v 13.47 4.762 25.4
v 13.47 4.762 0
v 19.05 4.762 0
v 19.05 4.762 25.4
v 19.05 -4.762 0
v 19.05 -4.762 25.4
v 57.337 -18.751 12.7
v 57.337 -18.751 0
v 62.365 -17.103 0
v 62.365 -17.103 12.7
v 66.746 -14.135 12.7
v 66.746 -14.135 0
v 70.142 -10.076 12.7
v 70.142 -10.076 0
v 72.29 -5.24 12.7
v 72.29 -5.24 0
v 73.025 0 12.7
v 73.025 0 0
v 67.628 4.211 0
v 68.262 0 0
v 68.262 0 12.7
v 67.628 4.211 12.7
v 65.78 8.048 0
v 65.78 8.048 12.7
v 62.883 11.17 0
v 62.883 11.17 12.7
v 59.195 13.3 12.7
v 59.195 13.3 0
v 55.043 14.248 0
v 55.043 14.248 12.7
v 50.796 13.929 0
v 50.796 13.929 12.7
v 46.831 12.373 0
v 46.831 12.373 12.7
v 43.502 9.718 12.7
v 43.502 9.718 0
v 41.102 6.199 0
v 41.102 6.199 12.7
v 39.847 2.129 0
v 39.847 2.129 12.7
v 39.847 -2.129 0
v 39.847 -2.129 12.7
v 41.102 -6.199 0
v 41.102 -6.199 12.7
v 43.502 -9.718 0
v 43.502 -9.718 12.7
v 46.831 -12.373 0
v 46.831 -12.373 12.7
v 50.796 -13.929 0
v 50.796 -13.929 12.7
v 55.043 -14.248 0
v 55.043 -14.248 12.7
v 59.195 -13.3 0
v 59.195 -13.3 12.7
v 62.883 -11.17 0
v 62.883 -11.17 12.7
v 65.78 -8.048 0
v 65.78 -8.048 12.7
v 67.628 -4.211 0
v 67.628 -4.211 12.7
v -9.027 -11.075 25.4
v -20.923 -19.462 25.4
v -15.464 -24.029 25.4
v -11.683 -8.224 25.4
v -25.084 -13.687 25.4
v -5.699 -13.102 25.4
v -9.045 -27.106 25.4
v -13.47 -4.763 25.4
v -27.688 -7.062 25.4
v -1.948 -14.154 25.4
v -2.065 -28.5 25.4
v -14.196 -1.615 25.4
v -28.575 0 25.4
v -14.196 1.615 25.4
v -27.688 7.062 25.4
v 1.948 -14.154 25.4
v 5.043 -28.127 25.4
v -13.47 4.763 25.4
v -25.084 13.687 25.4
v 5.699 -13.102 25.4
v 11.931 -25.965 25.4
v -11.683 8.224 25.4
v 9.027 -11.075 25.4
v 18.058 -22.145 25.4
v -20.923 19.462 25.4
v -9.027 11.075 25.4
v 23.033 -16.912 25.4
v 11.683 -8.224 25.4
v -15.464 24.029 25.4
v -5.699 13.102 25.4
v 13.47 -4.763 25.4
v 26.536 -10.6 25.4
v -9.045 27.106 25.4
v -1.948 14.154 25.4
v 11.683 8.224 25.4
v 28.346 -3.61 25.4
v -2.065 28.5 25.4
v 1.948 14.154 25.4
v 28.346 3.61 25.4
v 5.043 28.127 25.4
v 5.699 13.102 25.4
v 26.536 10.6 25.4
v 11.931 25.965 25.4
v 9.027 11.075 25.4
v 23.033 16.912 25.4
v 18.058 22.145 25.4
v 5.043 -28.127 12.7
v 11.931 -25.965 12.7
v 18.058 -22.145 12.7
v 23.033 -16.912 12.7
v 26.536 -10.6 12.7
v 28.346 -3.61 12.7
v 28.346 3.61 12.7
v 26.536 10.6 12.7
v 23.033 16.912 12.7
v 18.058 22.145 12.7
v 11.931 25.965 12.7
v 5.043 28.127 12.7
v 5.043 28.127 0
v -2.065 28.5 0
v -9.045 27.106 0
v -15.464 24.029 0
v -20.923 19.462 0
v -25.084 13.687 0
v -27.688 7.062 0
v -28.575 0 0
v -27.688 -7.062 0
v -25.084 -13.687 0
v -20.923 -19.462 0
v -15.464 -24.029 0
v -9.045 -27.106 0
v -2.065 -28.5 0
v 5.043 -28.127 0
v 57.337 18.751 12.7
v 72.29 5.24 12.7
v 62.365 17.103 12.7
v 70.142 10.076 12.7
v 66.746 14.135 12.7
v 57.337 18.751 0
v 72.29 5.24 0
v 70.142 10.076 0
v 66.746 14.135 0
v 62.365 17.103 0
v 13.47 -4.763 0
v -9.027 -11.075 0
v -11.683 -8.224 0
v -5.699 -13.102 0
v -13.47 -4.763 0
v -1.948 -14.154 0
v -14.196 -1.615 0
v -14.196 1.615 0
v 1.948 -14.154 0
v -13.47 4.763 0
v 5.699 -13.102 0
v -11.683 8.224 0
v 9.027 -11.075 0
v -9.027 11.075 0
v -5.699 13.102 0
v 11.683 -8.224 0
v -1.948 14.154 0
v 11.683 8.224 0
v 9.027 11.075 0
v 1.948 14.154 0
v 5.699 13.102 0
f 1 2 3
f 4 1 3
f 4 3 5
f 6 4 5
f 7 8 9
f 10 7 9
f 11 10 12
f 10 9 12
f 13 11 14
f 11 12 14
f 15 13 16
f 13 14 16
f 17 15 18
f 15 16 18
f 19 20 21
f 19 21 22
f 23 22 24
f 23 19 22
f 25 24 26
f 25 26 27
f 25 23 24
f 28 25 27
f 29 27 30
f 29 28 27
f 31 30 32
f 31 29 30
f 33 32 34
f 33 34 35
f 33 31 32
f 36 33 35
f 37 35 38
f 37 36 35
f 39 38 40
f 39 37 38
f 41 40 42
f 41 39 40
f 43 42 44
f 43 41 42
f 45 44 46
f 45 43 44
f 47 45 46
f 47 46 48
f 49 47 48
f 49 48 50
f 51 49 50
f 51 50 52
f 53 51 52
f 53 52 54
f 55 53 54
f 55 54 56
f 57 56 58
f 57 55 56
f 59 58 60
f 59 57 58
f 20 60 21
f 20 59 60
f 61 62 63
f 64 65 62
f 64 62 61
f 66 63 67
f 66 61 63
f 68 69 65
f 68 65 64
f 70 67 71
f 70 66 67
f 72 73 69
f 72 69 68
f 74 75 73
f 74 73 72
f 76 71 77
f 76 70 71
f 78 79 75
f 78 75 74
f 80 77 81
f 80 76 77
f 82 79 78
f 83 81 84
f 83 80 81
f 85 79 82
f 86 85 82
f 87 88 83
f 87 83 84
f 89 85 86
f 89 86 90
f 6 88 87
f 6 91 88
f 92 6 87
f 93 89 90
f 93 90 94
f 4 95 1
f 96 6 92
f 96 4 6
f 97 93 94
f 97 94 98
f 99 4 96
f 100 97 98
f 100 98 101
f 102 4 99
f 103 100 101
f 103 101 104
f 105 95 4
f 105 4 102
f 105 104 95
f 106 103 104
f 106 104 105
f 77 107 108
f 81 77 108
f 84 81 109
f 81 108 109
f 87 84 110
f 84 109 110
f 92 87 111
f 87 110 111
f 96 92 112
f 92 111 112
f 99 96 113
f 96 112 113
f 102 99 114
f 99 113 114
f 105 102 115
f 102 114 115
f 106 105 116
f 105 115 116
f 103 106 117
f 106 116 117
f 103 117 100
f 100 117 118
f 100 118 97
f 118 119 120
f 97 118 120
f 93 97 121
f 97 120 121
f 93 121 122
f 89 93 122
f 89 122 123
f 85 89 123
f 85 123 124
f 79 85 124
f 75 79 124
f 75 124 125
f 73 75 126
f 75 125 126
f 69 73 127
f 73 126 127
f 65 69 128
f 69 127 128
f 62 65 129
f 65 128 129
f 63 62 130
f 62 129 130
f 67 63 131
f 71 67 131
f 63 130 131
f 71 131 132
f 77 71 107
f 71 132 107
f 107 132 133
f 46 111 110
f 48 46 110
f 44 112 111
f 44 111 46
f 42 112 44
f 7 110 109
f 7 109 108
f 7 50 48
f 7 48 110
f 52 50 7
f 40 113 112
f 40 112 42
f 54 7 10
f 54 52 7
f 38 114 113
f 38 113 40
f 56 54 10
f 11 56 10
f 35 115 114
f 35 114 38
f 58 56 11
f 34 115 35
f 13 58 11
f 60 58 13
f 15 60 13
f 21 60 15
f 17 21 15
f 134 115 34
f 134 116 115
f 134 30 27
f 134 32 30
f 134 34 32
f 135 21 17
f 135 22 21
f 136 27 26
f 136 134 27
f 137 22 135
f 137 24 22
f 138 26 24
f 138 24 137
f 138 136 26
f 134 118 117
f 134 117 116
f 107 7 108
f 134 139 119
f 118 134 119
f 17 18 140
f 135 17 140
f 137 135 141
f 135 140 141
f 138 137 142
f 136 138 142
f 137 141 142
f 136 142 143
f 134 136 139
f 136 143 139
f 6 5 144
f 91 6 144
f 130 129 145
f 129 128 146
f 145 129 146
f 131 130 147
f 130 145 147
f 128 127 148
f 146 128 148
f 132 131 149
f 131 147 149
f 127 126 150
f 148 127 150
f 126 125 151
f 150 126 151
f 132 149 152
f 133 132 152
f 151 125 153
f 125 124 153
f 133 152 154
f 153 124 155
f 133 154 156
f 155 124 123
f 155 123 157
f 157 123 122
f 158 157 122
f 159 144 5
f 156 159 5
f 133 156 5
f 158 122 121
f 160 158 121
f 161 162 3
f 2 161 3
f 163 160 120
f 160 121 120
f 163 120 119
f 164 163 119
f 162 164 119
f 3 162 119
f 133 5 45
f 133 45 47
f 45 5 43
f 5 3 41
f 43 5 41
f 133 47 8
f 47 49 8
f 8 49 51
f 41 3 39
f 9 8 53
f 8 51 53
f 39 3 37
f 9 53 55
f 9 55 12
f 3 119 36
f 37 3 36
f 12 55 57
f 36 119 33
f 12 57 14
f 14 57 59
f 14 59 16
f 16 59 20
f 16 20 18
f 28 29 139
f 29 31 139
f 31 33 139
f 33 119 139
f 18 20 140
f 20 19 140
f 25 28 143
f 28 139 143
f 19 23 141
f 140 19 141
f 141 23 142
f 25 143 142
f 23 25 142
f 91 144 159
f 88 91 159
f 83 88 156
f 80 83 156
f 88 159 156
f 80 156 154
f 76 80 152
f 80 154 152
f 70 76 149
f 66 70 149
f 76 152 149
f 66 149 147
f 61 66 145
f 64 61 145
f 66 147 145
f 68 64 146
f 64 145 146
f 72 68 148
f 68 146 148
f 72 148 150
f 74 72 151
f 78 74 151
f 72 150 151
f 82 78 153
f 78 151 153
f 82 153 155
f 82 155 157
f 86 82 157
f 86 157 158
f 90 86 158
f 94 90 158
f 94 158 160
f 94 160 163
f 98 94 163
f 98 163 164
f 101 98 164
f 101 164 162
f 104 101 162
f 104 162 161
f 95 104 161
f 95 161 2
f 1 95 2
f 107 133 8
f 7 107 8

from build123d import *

# Parameters (mm, degrees)
F0_R     = 14.2875
F1_DEPTH = 12.7
F2_DEPTH = 25.4


with BuildPart() as f1:
    # F0 (on Top) → F1 (new body)
    with BuildSketch(Plane.XY):
        with BuildLine():
            ThreePointArc((5.0426470588, -28.1265414802), (21.9160245563, -18.3362616868), (28.575, 0))
            ThreePointArc((28.575, 0), (21.9160245563, 18.3362616868), (5.0426470588, 28.1265414802))
            ThreePointArc((5.0426470588, 28.1265414802), (-28.575, 0), (5.0426470588, -28.1265414802))
        make_face()
        with BuildLine():
            ThreePointArc((-13.4703841816, 4.7625), (0, 14.2875), (13.4703841816, 4.7625))
            Line((13.4703841816, 4.7625), (19.05, 4.7625))
            Line((19.05, 4.7625), (19.05, -4.7625))
            Line((19.05, -4.7625), (13.4703841816, -4.7625))
            ThreePointArc((13.4703841816, -4.7625), (0, -14.2875), (-13.4703841816, -4.7625))
            Line((-13.4703841816, -4.7625), (-19.05, -4.7625))
            Line((-19.05, -4.7625), (-19.05, 4.7625))
            Line((-19.05, 4.7625), (-13.4703841816, 4.7625))
        make_face(mode=Mode.SUBTRACT)
        with BuildLine():
            ThreePointArc((73.025, 0), (68.5856830375, 12.2241744579), (57.3367647059, 18.7510276535))
            ThreePointArc((57.3367647059, 18.7510276535), (34.925, 0), (57.3367647059, -18.7510276535))
            ThreePointArc((57.3367647059, -18.7510276535), (68.5856830375, -12.2241744579), (73.025, 0))
        make_face()
        with Locations((53.975, 0)):
            Circle(F0_R, mode=Mode.SUBTRACT)
        with BuildLine():
            ThreePointArc((5.0426470588, 28.1265414802), (21.9160245563, 18.3362616868), (28.575, 0))
            ThreePointArc((28.575, 0), (21.9160245563, -18.3362616868), (5.0426470588, -28.1265414802))
            Line((5.0426470588, -28.1265414802), (57.3367647059, -18.7510276535))
            ThreePointArc((57.3367647059, -18.7510276535), (34.925, 0), (57.3367647059, 18.7510276535))
            Line((57.3367647059, 18.7510276535), (5.0426470588, 28.1265414802))
        make_face()
        with BuildLine():
            ThreePointArc((-13.4703841816, -4.7625), (-14.2875, 0), (-13.4703841816, 4.7625))
            Line((-13.4703841816, 4.7625), (-19.05, 4.7625))
            Line((-19.05, 4.7625), (-19.05, -4.7625))
            Line((-19.05, -4.7625), (-13.4703841816, -4.7625))
        make_face()
    extrude(amount=F1_DEPTH)

    # F0 (on Top) → F2 (join)
    with BuildSketch(Plane.XY):
        with BuildLine():
            ThreePointArc((5.0426470588, -28.1265414802), (21.9160245563, -18.3362616868), (28.575, 0))
            ThreePointArc((28.575, 0), (21.9160245563, 18.3362616868), (5.0426470588, 28.1265414802))
            ThreePointArc((5.0426470588, 28.1265414802), (-28.575, 0), (5.0426470588, -28.1265414802))
        make_face()
        with BuildLine():
            ThreePointArc((-13.4703841816, 4.7625), (0, 14.2875), (13.4703841816, 4.7625))
            Line((13.4703841816, 4.7625), (19.05, 4.7625))
            Line((19.05, 4.7625), (19.05, -4.7625))
            Line((19.05, -4.7625), (13.4703841816, -4.7625))
            ThreePointArc((13.4703841816, -4.7625), (0, -14.2875), (-13.4703841816, -4.7625))
            Line((-13.4703841816, -4.7625), (-19.05, -4.7625))
            Line((-19.05, -4.7625), (-19.05, 4.7625))
            Line((-19.05, 4.7625), (-13.4703841816, 4.7625))
        make_face(mode=Mode.SUBTRACT)
        with BuildLine():
            ThreePointArc((-13.4703841816, -4.7625), (-14.2875, 0), (-13.4703841816, 4.7625))
            Line((-13.4703841816, 4.7625), (-19.05, 4.7625))
            Line((-19.05, 4.7625), (-19.05, -4.7625))
            Line((-19.05, -4.7625), (-13.4703841816, -4.7625))
        make_face()
    extrude(amount=F2_DEPTH)


solid = f1.part
